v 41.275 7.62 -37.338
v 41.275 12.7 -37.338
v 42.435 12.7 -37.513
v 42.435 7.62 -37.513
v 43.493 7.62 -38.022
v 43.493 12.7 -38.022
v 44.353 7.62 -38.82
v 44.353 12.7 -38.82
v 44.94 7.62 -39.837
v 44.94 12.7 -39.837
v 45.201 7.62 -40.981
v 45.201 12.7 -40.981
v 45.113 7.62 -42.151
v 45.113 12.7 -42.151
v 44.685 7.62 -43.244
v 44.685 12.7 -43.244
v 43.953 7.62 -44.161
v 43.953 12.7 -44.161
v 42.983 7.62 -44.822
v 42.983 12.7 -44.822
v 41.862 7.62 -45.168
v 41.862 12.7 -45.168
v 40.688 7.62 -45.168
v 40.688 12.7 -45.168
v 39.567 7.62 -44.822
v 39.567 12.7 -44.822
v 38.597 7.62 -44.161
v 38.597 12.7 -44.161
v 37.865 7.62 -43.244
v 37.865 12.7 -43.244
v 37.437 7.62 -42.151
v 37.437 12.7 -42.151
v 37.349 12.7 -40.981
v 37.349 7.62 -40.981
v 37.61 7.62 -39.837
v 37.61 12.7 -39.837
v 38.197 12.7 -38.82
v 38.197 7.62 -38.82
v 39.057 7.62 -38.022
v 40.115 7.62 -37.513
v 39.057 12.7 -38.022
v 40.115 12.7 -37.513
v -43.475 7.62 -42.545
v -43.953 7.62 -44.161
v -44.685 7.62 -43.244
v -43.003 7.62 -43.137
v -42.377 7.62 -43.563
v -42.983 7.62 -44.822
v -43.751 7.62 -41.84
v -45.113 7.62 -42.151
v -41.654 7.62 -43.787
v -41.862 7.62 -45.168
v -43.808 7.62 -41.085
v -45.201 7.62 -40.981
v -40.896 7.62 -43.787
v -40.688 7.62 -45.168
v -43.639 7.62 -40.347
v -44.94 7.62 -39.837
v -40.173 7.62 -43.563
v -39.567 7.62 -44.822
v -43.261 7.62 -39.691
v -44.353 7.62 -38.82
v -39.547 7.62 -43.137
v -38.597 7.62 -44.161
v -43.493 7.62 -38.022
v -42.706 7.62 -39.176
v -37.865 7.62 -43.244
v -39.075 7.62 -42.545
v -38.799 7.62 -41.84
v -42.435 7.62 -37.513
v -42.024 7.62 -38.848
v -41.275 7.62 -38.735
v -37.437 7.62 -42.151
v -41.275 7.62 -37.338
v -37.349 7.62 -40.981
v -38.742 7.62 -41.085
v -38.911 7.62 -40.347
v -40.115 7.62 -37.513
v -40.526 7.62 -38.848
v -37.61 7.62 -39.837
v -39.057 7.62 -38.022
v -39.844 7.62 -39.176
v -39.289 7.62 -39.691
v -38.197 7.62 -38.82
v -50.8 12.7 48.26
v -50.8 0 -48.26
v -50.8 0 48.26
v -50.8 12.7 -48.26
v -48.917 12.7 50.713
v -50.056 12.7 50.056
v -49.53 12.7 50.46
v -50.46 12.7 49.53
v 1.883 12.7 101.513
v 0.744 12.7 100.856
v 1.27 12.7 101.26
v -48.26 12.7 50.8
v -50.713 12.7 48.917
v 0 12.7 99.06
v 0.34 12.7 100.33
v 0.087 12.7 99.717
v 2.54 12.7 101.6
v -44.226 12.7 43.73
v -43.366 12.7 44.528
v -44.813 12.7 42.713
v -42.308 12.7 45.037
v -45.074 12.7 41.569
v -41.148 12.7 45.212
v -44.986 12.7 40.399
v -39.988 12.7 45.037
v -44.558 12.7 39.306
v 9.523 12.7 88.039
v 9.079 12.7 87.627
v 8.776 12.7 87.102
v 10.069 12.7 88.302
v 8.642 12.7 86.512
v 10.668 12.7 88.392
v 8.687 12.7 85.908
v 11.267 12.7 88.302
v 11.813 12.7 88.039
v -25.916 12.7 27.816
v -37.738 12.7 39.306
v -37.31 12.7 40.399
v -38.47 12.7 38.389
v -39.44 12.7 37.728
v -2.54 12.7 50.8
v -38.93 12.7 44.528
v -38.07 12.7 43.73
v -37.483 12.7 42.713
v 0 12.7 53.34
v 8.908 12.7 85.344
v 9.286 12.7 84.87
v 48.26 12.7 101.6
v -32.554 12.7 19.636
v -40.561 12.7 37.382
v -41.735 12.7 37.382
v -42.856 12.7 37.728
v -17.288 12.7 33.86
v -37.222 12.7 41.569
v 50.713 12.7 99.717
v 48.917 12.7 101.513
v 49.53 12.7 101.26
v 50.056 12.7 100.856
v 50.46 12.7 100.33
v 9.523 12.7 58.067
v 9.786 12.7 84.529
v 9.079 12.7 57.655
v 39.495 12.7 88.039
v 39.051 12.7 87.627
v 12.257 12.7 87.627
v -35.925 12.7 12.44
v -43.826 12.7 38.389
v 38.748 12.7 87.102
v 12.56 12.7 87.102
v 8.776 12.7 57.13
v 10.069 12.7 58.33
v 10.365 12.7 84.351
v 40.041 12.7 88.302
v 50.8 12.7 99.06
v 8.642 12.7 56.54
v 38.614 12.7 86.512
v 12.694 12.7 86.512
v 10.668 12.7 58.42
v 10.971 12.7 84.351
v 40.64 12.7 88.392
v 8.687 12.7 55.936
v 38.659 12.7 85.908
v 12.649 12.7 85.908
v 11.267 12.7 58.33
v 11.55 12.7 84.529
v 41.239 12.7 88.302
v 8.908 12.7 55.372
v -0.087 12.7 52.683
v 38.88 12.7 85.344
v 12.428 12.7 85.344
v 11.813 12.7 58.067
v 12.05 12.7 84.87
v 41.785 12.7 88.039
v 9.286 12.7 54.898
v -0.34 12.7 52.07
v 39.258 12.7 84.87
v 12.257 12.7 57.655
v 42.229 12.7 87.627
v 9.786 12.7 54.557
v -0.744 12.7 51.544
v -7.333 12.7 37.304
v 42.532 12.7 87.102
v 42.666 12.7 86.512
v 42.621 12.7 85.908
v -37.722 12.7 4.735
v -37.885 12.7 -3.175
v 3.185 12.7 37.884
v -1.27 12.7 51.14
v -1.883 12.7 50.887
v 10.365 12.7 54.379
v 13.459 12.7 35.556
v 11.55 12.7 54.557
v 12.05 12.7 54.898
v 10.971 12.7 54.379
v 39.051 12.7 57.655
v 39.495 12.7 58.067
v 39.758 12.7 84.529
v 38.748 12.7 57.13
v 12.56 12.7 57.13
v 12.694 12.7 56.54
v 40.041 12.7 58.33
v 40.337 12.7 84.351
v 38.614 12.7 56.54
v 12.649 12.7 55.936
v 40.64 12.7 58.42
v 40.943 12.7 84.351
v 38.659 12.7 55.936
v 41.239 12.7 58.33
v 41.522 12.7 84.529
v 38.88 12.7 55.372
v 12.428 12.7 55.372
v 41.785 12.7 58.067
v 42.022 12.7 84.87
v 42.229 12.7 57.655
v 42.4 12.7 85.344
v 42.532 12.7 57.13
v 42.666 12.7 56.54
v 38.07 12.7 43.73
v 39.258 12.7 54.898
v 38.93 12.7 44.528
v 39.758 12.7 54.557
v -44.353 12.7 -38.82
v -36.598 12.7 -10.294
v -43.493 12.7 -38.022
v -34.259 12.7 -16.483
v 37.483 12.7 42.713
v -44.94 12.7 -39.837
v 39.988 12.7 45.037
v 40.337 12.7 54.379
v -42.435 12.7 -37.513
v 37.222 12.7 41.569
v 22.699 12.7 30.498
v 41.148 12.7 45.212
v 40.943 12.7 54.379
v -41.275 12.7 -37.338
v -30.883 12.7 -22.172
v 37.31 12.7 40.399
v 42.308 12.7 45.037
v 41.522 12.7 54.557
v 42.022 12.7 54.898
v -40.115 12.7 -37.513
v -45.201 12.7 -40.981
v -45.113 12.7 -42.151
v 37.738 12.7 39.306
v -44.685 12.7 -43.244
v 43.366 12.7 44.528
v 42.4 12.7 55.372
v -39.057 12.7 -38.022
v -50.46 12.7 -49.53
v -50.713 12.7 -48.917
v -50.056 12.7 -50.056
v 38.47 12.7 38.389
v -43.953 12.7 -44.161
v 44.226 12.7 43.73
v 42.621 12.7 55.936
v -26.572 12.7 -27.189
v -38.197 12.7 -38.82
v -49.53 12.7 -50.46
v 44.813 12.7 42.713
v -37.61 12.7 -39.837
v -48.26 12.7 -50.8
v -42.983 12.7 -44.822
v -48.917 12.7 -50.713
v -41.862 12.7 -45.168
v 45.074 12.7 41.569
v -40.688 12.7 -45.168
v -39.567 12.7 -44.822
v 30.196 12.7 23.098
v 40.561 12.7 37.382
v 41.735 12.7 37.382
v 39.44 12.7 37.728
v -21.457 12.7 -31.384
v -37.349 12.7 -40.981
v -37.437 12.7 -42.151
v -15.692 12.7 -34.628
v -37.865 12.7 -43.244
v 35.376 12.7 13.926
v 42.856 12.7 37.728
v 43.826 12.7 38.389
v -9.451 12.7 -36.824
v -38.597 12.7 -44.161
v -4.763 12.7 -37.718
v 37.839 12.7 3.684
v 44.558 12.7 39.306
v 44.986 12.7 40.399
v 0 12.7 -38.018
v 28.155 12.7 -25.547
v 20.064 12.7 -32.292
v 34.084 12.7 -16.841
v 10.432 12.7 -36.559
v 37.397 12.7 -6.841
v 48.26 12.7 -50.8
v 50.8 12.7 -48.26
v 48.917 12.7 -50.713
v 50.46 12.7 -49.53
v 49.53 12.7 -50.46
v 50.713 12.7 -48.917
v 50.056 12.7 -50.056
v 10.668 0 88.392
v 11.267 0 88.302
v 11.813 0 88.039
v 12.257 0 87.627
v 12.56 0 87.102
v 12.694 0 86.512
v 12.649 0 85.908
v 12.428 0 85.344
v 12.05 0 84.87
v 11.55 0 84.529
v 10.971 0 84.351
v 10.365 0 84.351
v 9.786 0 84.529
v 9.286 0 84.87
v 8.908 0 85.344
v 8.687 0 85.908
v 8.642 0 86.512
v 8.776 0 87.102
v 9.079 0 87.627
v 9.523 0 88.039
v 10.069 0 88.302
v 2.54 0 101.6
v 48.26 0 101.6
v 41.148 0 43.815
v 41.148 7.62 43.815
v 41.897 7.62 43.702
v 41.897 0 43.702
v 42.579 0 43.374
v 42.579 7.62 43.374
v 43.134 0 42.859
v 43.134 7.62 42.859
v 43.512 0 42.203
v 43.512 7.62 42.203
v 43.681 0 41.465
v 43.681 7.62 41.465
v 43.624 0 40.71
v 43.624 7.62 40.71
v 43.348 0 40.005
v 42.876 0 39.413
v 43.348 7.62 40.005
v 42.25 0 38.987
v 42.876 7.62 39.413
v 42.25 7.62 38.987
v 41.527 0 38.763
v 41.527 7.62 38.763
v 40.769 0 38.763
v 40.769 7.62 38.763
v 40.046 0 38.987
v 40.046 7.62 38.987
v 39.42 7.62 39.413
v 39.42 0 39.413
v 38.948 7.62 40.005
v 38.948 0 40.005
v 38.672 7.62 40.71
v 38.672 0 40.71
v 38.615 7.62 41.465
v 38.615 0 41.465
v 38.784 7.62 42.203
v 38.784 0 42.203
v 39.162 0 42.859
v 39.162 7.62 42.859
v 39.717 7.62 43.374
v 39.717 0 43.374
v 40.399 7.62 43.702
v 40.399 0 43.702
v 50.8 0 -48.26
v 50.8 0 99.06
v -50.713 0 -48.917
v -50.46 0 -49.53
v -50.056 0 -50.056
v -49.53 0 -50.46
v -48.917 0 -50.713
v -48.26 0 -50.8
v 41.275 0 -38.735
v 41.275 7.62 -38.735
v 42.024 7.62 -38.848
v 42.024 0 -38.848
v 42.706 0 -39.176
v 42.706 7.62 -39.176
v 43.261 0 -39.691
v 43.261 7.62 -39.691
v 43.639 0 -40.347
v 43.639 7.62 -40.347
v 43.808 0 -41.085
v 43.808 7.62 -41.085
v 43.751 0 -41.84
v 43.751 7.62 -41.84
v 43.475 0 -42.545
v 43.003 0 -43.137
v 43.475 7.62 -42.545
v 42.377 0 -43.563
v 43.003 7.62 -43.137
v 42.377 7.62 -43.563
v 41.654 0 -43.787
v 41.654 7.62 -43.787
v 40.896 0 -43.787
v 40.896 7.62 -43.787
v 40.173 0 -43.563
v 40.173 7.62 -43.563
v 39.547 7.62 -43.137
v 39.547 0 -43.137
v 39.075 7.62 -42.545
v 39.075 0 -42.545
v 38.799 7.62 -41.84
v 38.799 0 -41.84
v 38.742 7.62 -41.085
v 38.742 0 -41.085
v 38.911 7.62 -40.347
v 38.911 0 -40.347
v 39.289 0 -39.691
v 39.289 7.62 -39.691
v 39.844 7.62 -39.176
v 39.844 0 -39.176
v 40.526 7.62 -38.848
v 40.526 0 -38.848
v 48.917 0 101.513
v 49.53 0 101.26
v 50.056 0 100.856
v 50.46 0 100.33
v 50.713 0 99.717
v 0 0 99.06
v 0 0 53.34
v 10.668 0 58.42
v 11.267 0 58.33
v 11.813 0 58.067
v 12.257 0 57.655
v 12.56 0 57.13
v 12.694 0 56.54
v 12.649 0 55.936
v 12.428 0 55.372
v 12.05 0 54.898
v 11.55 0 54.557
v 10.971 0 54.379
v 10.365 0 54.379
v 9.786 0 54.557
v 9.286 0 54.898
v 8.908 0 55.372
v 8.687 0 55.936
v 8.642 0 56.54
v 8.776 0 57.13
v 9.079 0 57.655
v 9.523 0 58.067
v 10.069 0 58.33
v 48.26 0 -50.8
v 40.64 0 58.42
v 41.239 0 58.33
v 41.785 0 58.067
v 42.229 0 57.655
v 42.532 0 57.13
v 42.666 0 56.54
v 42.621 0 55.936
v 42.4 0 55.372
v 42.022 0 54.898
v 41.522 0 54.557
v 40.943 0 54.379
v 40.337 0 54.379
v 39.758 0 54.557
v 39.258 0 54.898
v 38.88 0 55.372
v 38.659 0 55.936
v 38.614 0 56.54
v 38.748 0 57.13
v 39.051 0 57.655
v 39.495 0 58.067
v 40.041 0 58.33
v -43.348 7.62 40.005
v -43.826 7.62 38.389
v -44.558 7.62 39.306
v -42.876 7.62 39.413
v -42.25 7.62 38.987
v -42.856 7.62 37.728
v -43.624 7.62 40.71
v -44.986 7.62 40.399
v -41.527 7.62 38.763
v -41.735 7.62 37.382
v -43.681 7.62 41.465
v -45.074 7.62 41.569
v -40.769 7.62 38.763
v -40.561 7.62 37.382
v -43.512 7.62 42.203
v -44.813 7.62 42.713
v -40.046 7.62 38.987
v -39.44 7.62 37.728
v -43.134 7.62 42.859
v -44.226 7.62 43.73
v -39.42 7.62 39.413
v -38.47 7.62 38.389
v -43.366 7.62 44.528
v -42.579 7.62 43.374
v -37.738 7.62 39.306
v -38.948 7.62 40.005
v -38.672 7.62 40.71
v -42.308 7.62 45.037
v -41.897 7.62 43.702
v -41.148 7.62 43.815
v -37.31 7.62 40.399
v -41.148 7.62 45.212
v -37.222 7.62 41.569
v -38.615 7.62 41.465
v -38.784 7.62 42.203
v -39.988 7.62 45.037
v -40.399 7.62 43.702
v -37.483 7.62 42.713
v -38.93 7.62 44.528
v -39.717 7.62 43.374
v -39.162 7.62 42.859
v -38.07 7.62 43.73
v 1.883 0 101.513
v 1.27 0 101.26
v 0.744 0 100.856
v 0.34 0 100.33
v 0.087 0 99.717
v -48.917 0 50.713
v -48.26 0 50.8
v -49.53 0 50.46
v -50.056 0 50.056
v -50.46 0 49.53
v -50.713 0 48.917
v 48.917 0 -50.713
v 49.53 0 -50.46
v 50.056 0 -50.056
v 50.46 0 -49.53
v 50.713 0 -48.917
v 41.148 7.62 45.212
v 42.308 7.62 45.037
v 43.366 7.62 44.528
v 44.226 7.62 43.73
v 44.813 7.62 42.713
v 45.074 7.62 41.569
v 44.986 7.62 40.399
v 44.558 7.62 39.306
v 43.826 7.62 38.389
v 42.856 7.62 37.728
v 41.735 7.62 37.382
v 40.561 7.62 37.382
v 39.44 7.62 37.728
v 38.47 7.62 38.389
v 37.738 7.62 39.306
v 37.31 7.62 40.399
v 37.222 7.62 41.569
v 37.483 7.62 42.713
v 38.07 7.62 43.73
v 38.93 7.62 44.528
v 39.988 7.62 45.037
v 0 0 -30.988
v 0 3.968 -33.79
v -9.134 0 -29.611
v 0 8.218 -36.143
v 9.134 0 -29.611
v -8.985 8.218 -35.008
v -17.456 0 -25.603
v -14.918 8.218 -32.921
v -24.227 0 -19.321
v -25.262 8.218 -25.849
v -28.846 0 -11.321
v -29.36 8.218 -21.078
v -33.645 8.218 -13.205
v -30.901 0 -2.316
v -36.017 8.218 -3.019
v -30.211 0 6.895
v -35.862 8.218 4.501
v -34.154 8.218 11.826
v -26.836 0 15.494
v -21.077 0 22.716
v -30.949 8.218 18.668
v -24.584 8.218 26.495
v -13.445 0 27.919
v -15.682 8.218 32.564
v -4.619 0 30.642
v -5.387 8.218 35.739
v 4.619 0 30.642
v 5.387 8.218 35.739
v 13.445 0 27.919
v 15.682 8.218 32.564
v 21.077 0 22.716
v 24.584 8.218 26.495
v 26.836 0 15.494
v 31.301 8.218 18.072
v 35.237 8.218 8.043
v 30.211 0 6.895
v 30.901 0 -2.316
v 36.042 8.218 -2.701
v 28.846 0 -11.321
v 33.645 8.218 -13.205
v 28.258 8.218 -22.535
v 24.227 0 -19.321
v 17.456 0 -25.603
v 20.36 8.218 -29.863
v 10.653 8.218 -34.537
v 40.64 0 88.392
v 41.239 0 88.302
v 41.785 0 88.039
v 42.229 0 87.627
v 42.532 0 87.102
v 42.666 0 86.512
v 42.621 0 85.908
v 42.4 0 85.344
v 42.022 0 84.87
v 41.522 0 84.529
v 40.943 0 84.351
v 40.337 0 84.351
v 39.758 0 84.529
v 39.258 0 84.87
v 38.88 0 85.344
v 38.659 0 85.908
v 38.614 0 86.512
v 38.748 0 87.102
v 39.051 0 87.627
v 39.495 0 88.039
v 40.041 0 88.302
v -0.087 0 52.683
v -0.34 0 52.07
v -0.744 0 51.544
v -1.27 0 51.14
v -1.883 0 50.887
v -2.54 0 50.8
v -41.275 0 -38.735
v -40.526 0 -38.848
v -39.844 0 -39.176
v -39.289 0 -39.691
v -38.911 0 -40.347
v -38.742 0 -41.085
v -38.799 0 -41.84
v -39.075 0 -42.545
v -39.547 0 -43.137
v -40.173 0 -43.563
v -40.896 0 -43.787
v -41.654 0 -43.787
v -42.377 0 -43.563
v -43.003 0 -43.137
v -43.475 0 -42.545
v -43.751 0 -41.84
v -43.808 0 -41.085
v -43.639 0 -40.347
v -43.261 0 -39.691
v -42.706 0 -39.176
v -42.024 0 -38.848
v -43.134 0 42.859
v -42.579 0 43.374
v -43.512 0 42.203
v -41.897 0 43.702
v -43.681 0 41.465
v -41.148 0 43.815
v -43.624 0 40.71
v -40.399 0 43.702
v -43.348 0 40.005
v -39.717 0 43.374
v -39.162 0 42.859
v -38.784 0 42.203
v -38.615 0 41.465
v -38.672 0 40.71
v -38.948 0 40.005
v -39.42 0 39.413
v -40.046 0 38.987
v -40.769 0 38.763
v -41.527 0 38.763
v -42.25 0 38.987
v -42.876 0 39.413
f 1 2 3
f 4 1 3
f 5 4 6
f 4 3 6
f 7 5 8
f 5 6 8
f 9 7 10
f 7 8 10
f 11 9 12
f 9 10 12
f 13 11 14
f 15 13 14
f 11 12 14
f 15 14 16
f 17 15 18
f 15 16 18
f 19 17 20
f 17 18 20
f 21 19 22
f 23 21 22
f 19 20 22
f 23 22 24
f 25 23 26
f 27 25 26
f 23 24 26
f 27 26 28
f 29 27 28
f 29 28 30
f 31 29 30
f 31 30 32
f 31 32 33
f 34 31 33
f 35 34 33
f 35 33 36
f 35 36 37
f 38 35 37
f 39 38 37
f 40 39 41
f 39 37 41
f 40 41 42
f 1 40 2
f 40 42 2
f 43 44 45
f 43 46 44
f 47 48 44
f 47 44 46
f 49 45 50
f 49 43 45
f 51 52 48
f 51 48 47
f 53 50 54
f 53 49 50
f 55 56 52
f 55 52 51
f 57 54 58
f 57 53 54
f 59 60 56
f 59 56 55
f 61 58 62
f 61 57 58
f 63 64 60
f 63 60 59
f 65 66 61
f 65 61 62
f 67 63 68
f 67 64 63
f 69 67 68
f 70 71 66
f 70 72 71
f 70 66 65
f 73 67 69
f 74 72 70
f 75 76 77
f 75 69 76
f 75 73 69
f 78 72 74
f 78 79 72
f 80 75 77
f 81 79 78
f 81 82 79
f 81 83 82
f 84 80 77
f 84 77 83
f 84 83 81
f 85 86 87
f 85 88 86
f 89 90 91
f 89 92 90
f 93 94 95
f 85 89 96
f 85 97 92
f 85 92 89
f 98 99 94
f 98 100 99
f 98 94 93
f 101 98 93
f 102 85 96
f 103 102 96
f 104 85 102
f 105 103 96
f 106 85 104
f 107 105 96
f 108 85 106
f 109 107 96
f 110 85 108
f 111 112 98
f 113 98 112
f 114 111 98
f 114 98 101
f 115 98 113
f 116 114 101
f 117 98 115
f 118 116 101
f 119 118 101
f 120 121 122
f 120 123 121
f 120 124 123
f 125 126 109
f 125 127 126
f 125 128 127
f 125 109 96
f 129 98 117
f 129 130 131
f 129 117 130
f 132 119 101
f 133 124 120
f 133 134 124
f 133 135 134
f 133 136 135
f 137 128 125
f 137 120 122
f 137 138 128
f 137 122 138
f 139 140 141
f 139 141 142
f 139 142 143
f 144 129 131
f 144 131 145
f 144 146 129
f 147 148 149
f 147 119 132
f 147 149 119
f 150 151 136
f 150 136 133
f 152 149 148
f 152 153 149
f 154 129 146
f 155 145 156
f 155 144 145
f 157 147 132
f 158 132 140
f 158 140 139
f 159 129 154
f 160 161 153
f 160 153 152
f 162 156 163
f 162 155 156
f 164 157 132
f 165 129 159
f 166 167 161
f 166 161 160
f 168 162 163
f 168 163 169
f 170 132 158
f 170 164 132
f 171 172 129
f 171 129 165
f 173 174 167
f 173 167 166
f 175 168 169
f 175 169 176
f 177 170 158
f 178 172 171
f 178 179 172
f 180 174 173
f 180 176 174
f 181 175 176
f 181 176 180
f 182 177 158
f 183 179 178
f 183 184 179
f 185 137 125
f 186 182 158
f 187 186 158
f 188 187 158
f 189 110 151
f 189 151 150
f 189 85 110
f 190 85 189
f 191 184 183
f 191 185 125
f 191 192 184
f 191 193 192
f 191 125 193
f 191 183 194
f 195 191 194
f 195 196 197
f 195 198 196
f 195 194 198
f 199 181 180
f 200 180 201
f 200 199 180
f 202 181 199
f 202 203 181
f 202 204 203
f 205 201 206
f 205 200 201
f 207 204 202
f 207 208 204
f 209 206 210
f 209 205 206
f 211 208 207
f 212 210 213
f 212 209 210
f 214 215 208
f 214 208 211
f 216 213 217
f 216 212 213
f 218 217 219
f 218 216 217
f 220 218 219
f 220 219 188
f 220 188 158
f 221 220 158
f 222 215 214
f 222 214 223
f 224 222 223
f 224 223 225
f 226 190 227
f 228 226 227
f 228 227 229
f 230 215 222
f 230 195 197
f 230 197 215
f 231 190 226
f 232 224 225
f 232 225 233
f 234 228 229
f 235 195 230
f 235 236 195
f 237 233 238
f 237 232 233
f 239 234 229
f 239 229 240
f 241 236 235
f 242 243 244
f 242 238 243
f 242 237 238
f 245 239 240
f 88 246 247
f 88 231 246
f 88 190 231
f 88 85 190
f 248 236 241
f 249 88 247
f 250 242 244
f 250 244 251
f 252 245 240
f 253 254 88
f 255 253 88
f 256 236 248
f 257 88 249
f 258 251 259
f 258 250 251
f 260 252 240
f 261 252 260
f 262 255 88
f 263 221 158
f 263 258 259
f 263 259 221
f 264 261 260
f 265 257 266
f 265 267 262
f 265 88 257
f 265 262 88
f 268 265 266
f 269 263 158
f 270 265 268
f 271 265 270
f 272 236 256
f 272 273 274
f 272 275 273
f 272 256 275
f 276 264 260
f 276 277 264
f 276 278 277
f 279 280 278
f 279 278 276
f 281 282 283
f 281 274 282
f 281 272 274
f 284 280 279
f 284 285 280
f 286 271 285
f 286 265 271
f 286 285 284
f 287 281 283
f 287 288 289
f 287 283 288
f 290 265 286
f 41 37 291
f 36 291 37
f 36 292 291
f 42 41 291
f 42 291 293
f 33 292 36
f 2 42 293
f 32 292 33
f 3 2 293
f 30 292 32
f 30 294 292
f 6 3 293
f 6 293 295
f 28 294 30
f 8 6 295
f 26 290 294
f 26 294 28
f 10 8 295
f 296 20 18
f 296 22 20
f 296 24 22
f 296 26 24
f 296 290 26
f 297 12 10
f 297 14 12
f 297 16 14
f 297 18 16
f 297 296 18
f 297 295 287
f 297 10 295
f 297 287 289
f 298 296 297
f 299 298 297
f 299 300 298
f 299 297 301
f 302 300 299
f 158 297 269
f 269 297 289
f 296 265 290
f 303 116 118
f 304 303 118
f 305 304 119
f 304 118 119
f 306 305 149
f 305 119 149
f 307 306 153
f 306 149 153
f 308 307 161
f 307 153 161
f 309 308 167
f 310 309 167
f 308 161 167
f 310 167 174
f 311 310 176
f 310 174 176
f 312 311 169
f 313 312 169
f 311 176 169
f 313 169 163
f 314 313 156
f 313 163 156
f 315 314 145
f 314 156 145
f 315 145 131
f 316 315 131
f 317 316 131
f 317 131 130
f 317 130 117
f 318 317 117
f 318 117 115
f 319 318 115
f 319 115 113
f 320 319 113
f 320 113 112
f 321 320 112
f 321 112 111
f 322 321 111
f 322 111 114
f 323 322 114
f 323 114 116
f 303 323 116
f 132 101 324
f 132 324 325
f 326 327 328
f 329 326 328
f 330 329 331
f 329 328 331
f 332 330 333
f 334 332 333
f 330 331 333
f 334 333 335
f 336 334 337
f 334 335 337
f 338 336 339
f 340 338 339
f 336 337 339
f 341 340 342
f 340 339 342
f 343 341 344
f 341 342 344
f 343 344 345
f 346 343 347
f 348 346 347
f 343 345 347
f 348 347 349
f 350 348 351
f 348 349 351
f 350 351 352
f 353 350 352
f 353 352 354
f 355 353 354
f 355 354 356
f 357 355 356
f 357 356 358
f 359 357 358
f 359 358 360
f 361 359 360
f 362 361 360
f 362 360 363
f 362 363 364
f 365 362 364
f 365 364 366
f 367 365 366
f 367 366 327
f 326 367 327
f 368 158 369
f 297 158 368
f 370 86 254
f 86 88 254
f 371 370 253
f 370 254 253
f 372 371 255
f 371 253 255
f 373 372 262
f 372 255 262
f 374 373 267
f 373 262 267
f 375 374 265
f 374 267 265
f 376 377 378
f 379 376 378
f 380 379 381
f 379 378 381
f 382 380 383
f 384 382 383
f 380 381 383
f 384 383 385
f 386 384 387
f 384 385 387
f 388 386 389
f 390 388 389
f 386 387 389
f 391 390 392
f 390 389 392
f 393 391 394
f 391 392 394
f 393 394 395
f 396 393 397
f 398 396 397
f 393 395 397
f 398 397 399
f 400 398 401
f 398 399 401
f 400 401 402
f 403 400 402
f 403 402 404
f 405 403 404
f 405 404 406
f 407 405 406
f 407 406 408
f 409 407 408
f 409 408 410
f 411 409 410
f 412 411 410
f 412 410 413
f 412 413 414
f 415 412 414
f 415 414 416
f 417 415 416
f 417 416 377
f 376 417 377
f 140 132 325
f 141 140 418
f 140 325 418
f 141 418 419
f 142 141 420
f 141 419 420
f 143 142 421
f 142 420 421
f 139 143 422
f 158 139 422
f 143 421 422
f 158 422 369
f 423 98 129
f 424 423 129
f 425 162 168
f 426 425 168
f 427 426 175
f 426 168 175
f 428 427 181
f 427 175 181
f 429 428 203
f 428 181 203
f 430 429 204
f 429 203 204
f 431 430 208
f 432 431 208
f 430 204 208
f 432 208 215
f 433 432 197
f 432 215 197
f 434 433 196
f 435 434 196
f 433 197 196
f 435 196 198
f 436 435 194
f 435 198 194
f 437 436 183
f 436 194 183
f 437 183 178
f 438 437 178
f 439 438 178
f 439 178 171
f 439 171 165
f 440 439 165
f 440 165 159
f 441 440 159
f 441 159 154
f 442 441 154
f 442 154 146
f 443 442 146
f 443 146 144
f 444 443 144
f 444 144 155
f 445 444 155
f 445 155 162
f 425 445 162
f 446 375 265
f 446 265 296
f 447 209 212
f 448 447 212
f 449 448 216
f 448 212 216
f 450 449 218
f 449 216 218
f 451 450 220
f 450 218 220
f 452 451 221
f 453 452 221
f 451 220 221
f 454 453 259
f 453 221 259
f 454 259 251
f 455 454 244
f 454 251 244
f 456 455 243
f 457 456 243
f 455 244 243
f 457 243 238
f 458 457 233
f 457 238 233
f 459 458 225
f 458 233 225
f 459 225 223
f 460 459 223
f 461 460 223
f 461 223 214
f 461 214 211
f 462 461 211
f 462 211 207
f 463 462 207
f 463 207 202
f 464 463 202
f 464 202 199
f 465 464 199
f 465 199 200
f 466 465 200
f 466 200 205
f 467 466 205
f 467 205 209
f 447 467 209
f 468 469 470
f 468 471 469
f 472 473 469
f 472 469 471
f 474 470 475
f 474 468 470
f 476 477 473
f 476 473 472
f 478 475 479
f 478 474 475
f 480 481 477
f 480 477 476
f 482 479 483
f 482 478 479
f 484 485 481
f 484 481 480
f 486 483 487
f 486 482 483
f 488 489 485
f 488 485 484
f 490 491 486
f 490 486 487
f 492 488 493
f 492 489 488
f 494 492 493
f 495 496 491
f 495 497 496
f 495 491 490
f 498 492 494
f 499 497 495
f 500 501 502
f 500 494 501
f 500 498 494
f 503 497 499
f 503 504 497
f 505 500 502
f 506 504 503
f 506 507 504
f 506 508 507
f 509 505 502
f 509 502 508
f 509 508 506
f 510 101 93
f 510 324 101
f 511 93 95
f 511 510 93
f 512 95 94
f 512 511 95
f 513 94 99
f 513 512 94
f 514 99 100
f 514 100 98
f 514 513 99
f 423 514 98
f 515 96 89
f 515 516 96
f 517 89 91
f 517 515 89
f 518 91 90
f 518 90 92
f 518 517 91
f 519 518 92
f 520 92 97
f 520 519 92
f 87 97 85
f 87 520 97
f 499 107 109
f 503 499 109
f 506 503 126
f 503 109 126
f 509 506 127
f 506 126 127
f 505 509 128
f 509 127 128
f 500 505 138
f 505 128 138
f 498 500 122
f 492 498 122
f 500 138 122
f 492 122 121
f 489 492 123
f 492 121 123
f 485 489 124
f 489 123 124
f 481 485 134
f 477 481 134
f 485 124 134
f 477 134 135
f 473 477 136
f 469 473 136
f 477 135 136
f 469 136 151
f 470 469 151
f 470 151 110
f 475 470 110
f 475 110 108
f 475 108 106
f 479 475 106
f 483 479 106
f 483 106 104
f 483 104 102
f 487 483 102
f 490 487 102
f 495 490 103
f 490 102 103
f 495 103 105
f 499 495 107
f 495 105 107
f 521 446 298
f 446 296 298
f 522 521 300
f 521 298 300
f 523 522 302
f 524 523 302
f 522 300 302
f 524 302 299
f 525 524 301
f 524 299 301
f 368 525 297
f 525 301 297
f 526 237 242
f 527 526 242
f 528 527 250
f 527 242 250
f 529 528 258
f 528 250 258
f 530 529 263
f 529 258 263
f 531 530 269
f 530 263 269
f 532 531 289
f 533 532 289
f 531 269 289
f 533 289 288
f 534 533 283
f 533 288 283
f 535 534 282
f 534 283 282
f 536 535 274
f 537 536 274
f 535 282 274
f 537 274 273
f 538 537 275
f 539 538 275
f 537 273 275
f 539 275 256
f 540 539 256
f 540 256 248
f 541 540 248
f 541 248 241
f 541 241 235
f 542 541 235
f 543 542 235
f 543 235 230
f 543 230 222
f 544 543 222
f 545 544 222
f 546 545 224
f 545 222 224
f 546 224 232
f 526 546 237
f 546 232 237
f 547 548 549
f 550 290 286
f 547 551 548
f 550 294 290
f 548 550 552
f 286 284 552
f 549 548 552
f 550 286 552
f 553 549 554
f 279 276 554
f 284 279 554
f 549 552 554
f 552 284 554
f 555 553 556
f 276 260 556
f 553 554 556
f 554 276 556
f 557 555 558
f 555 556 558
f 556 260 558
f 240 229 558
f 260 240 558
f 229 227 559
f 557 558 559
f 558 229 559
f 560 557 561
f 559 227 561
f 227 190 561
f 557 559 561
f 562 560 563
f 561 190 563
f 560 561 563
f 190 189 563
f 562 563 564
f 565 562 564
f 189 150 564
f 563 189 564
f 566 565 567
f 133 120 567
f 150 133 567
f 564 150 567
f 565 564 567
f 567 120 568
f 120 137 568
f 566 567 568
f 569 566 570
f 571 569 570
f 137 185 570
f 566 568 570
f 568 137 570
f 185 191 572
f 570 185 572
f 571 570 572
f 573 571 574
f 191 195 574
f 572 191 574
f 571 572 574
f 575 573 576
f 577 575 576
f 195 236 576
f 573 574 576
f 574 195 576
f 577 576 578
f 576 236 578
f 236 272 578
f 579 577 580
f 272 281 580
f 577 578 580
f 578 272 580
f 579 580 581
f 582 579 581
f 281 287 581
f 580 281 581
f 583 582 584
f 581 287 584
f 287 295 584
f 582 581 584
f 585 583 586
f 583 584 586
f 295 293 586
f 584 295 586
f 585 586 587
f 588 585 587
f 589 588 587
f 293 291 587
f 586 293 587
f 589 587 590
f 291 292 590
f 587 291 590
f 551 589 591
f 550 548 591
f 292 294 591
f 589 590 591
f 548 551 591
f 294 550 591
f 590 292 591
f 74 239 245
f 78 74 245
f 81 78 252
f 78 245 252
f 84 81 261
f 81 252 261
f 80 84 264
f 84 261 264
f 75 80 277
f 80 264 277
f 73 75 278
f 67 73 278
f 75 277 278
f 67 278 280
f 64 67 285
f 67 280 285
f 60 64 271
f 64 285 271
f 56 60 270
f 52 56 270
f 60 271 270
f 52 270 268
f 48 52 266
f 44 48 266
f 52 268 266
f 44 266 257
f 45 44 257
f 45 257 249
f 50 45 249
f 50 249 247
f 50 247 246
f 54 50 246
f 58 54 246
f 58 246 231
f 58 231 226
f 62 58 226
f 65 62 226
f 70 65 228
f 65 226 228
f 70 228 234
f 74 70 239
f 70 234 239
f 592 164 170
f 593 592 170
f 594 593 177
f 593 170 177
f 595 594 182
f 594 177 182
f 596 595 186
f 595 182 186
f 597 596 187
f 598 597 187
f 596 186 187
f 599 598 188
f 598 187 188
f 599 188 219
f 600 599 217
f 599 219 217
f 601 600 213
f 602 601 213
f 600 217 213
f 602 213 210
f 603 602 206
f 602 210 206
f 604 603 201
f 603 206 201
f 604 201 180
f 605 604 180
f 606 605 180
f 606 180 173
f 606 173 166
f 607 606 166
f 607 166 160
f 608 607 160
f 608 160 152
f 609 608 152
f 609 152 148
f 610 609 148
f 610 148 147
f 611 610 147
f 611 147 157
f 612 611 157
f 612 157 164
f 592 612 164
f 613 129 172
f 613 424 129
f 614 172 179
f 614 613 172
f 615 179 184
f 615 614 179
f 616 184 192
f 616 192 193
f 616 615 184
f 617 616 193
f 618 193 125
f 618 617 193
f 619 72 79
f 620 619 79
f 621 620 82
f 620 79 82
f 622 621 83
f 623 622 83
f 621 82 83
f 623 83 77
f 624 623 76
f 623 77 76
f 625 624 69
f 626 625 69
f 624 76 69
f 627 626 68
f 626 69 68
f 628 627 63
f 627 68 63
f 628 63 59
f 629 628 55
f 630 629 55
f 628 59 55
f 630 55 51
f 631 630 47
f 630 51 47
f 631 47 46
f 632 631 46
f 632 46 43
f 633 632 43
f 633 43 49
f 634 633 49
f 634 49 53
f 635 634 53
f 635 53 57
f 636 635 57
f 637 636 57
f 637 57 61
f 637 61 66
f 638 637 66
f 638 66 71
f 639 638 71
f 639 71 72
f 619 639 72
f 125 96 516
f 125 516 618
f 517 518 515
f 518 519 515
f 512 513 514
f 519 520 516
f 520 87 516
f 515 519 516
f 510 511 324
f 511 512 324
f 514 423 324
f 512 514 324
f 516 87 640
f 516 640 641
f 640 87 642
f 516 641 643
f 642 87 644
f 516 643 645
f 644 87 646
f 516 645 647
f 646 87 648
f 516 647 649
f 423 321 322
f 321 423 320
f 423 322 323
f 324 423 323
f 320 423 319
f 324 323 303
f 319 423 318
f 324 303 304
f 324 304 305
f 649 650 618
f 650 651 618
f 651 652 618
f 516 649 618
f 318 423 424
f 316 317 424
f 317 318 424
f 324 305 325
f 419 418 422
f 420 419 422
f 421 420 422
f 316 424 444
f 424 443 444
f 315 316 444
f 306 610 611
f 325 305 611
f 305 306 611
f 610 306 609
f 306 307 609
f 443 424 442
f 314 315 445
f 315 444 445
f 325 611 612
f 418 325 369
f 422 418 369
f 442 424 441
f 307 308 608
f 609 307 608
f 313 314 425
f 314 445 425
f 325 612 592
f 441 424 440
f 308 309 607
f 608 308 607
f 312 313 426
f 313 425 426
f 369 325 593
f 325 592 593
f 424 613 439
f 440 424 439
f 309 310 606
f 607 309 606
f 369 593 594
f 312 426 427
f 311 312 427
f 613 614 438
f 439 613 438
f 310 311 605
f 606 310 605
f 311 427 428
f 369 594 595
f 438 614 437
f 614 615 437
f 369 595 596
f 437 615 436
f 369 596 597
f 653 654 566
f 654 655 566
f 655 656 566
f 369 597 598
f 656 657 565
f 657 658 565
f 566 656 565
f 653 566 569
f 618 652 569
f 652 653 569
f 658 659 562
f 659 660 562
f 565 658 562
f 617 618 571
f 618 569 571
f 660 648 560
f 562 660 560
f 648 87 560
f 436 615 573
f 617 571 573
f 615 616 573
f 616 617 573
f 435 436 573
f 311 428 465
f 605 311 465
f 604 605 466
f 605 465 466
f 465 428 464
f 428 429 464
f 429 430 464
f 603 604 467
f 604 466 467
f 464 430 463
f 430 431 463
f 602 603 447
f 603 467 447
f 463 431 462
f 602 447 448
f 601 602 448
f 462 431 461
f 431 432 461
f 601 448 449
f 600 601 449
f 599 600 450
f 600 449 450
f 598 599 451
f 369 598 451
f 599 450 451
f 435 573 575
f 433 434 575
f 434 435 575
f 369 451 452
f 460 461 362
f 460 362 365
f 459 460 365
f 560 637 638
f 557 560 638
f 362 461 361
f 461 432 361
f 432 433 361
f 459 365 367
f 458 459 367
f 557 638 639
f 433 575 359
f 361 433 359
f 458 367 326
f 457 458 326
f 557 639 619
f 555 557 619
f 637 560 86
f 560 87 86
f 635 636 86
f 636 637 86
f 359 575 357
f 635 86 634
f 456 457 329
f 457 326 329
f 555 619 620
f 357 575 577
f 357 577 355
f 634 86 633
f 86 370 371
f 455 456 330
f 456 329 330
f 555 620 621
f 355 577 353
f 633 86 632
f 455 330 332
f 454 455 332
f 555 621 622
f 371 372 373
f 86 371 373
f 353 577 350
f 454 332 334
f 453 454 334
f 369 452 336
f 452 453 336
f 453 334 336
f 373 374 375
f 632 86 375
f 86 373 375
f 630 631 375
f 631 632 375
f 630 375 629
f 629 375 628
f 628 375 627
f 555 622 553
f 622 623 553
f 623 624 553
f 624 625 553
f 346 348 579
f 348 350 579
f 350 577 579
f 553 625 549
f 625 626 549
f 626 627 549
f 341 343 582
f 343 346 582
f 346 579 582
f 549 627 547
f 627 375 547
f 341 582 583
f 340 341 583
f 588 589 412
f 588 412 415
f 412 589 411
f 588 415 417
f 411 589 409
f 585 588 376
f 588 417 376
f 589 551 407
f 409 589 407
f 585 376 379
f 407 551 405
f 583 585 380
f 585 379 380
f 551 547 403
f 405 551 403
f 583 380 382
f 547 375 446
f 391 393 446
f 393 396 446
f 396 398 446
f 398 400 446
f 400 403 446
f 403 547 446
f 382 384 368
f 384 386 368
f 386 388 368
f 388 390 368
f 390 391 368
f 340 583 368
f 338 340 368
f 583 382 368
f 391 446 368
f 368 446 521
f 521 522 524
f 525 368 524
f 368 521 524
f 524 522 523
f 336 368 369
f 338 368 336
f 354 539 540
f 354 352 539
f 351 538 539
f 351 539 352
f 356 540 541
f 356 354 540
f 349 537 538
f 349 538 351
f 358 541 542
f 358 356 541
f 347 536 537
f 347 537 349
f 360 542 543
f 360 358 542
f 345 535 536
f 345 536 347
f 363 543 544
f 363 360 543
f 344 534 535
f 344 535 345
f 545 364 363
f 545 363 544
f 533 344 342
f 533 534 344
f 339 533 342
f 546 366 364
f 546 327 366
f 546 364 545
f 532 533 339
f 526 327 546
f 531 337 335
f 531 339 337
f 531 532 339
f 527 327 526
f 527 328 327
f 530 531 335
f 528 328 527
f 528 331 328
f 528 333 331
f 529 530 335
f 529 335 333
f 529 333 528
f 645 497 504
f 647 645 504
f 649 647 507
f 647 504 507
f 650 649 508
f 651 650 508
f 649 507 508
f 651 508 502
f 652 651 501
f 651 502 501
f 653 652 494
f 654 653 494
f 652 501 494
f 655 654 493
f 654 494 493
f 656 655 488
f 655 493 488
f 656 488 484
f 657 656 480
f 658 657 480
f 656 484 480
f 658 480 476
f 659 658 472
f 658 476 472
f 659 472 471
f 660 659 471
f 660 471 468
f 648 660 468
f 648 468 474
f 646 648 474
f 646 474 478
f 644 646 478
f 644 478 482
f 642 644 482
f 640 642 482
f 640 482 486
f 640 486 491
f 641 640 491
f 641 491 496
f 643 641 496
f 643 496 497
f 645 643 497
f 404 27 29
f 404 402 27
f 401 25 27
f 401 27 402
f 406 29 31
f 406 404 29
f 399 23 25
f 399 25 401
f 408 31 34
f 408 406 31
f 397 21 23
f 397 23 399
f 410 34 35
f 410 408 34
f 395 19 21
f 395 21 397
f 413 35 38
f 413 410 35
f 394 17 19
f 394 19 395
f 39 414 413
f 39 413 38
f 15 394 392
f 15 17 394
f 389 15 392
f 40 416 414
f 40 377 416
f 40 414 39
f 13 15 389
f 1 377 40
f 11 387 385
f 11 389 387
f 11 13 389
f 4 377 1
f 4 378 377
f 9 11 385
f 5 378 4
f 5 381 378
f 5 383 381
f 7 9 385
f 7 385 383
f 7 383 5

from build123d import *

# Parameters (mm, degrees)
SKETCH1_W           = 101.6
SKETCH1_H           = 101.6
BOSS_EXTRUDE1_DEPTH = 12.7
SKETCH4_R           = 2.54
CUT_EXTRUDE3_DEPTH  = 73.955945768
SKETCH6_R           = 3.937
CUT_EXTRUDE4_DEPTH  = 5.08
FILLET2_R           = 2.54
BOSS_EXTRUDE2_DEPTH = 12.7
SKETCH8_R           = 3.937
CUT_EXTRUDE5_DEPTH  = 5.08
SKETCH9_R           = 2.54
CUT_EXTRUDE6_DEPTH  = 115.300000144
FILLET4_R           = 2.54
SKETCH11_R          = 2.032
CUT_EXTRUDE7_DEPTH  = 115.300000144
SKETCH12_W          = 50.8
SKETCH12_H          = 50.8
CUT_EXTRUDE8_DEPTH  = 115.300000144
FILLET5_R           = 2.54


with BuildPart() as part:
    # Sketch1 → Boss-Extrude1 (new body)
    with BuildSketch(Plane(origin=(0, 0, 0), x_dir=(1, 0, 0), z_dir=(0, 1, 0))):
        Rectangle(SKETCH1_W, SKETCH1_H)
    extrude(amount=BOSS_EXTRUDE1_DEPTH)

    # Sketch5 → Cut-Revolve1 (revolve, cut)
    with BuildSketch(Plane.XY, mode=Mode.PRIVATE) as cut_revolve1_sk:
        with BuildLine():
            Line((0, 0), (30.988, 0))
            ThreePointArc((30.988, 0), (35.469857517, 6.88539078), (38.608, 14.478))
            Line((38.608, 14.478), (0, 14.478))
            Line((0, 14.478), (0, 0))
        make_face()
    revolve(cut_revolve1_sk.sketch.rotate(Axis((0, 0, 0), (0, 1, 0)), 90), axis=Axis((0, 0, 0), (0, 1, 0)), mode=Mode.SUBTRACT)

    # Sketch4 → Cut-Extrude3 (cut, through all)
    with BuildSketch(Plane(origin=(0, 12.7, 0), x_dir=(1, 0, 0), z_dir=(0, 1, 0))):
        with Locations(Location((-41.275, 41.275, 0), (0, 0, 270))):
            Circle(SKETCH4_R)
        with Locations(Location((41.275, 41.275, 0), (0, 0, 270))):
            Circle(SKETCH4_R)
    extrude(amount=-CUT_EXTRUDE3_DEPTH, mode=Mode.SUBTRACT)

    # Sketch6 → Cut-Extrude4 (cut)
    with BuildSketch(Plane(origin=(0, 12.7, 0), x_dir=(1, 0, 0), z_dir=(0, 1, 0))):
        with Locations(Location((-41.275, 41.275, 0), (0, 0, 270))):
            Circle(SKETCH6_R)
        with Locations(Location((41.275, 41.275, 0), (0, 0, 270))):
            Circle(SKETCH6_R)
    extrude(amount=-CUT_EXTRUDE4_DEPTH, mode=Mode.SUBTRACT)

    # Fillet2
    fillet2_edges = [part.edges().sort_by_distance(p)[0] for p in [
        (50.8, 6.35, 50.8),
        (-50.8, 6.35, 50.8),
        (-50.8, 6.35, -50.8),
        (50.8, 6.35, -50.8),
    ]]
    fillet(fillet2_edges, radius=FILLET2_R)

    # Sketch7 → Boss-Extrude2 (add)
    with BuildSketch(Plane(origin=(0, 12.7, 0), x_dir=(1, 0, 0), z_dir=(0, 1, 0))):
        with BuildLine():
            Line((-50.8, -101.6), (50.8, -101.6))
            Line((50.8, -101.6), (50.8, -48.26))
            ThreePointArc((50.8, -48.26), (50.056051224, -50.056051224), (48.26, -50.8))
            Line((48.26, -50.8), (-48.26, -50.8))
            ThreePointArc((-48.26, -50.8), (-50.056051224, -50.056051224), (-50.8, -48.26))
            Line((-50.8, -48.26), (-50.8, -101.6))
        make_face()
    extrude(amount=-BOSS_EXTRUDE2_DEPTH)

    # Sketch8 → Cut-Extrude5 (cut)
    with BuildSketch(Plane(origin=(0, 12.7, 0), x_dir=(1, 0, 0), z_dir=(0, 1, 0))):
        with Locations(Location((-41.148, -41.275, 0), (0, 0, 270))):
            Circle(SKETCH8_R)
        with Locations(Location((41.148, -41.275, 0), (0, 0, 270))):
            Circle(SKETCH8_R)
    extrude(amount=-CUT_EXTRUDE5_DEPTH, mode=Mode.SUBTRACT)

    # Sketch9 → Cut-Extrude6 (cut, through all)
    with BuildSketch(Plane(origin=(0, 12.7, 0), x_dir=(1, 0, 0), z_dir=(0, 1, 0))):
        with Locations(Location((-41.148, -41.275, 0), (0, 0, 270))):
            Circle(SKETCH9_R)
        with Locations(Location((41.148, -41.275, 0), (0, 0, 270))):
            Circle(SKETCH9_R)
    extrude(amount=-CUT_EXTRUDE6_DEPTH, mode=Mode.SUBTRACT)

    # Fillet4
    fillet4_edges = [part.edges().sort_by_distance(p)[0] for p in [
        (-50.8, 6.35, 101.6),
        (50.8, 6.35, 101.6),
    ]]
    fillet(fillet4_edges, radius=FILLET4_R)

    # Sketch11 → Cut-Extrude7 (cut, through all)
    with BuildSketch(Plane(origin=(0, 12.7, 0), x_dir=(1, 0, 0), z_dir=(0, 1, 0))):
        with Locations(Location((10.668, -56.388, 0), (0, 0, 270))):
            Circle(SKETCH11_R)
        with Locations(Location((10.668, -86.36, 0), (0, 0, 270))):
            Circle(SKETCH11_R)
        with Locations(Location((40.64, -86.36, 0), (0, 0, 270))):
            Circle(SKETCH11_R)
        with Locations(Location((40.64, -56.388, 0), (0, 0, 270))):
            Circle(SKETCH11_R)
    extrude(amount=-CUT_EXTRUDE7_DEPTH, mode=Mode.SUBTRACT)

    # Sketch12 → Cut-Extrude8 (cut, through all)
    with BuildSketch(Plane(origin=(0, 12.7, 0), x_dir=(1, 0, 0), z_dir=(0, 1, 0))):
        with Locations((-25.4, -76.2)):
            Rectangle(SKETCH12_W, SKETCH12_H)
    extrude(amount=-CUT_EXTRUDE8_DEPTH, mode=Mode.SUBTRACT)

    # Fillet5
    fillet5_edges = [part.edges().sort_by_distance(p)[0] for p in [
        (0, 6.35, 101.6),
        (0, 6.35, 50.8),
        (-50.8, 6.35, 50.8),
    ]]
    fillet(fillet5_edges, radius=FILLET5_R)


solid = part.part
